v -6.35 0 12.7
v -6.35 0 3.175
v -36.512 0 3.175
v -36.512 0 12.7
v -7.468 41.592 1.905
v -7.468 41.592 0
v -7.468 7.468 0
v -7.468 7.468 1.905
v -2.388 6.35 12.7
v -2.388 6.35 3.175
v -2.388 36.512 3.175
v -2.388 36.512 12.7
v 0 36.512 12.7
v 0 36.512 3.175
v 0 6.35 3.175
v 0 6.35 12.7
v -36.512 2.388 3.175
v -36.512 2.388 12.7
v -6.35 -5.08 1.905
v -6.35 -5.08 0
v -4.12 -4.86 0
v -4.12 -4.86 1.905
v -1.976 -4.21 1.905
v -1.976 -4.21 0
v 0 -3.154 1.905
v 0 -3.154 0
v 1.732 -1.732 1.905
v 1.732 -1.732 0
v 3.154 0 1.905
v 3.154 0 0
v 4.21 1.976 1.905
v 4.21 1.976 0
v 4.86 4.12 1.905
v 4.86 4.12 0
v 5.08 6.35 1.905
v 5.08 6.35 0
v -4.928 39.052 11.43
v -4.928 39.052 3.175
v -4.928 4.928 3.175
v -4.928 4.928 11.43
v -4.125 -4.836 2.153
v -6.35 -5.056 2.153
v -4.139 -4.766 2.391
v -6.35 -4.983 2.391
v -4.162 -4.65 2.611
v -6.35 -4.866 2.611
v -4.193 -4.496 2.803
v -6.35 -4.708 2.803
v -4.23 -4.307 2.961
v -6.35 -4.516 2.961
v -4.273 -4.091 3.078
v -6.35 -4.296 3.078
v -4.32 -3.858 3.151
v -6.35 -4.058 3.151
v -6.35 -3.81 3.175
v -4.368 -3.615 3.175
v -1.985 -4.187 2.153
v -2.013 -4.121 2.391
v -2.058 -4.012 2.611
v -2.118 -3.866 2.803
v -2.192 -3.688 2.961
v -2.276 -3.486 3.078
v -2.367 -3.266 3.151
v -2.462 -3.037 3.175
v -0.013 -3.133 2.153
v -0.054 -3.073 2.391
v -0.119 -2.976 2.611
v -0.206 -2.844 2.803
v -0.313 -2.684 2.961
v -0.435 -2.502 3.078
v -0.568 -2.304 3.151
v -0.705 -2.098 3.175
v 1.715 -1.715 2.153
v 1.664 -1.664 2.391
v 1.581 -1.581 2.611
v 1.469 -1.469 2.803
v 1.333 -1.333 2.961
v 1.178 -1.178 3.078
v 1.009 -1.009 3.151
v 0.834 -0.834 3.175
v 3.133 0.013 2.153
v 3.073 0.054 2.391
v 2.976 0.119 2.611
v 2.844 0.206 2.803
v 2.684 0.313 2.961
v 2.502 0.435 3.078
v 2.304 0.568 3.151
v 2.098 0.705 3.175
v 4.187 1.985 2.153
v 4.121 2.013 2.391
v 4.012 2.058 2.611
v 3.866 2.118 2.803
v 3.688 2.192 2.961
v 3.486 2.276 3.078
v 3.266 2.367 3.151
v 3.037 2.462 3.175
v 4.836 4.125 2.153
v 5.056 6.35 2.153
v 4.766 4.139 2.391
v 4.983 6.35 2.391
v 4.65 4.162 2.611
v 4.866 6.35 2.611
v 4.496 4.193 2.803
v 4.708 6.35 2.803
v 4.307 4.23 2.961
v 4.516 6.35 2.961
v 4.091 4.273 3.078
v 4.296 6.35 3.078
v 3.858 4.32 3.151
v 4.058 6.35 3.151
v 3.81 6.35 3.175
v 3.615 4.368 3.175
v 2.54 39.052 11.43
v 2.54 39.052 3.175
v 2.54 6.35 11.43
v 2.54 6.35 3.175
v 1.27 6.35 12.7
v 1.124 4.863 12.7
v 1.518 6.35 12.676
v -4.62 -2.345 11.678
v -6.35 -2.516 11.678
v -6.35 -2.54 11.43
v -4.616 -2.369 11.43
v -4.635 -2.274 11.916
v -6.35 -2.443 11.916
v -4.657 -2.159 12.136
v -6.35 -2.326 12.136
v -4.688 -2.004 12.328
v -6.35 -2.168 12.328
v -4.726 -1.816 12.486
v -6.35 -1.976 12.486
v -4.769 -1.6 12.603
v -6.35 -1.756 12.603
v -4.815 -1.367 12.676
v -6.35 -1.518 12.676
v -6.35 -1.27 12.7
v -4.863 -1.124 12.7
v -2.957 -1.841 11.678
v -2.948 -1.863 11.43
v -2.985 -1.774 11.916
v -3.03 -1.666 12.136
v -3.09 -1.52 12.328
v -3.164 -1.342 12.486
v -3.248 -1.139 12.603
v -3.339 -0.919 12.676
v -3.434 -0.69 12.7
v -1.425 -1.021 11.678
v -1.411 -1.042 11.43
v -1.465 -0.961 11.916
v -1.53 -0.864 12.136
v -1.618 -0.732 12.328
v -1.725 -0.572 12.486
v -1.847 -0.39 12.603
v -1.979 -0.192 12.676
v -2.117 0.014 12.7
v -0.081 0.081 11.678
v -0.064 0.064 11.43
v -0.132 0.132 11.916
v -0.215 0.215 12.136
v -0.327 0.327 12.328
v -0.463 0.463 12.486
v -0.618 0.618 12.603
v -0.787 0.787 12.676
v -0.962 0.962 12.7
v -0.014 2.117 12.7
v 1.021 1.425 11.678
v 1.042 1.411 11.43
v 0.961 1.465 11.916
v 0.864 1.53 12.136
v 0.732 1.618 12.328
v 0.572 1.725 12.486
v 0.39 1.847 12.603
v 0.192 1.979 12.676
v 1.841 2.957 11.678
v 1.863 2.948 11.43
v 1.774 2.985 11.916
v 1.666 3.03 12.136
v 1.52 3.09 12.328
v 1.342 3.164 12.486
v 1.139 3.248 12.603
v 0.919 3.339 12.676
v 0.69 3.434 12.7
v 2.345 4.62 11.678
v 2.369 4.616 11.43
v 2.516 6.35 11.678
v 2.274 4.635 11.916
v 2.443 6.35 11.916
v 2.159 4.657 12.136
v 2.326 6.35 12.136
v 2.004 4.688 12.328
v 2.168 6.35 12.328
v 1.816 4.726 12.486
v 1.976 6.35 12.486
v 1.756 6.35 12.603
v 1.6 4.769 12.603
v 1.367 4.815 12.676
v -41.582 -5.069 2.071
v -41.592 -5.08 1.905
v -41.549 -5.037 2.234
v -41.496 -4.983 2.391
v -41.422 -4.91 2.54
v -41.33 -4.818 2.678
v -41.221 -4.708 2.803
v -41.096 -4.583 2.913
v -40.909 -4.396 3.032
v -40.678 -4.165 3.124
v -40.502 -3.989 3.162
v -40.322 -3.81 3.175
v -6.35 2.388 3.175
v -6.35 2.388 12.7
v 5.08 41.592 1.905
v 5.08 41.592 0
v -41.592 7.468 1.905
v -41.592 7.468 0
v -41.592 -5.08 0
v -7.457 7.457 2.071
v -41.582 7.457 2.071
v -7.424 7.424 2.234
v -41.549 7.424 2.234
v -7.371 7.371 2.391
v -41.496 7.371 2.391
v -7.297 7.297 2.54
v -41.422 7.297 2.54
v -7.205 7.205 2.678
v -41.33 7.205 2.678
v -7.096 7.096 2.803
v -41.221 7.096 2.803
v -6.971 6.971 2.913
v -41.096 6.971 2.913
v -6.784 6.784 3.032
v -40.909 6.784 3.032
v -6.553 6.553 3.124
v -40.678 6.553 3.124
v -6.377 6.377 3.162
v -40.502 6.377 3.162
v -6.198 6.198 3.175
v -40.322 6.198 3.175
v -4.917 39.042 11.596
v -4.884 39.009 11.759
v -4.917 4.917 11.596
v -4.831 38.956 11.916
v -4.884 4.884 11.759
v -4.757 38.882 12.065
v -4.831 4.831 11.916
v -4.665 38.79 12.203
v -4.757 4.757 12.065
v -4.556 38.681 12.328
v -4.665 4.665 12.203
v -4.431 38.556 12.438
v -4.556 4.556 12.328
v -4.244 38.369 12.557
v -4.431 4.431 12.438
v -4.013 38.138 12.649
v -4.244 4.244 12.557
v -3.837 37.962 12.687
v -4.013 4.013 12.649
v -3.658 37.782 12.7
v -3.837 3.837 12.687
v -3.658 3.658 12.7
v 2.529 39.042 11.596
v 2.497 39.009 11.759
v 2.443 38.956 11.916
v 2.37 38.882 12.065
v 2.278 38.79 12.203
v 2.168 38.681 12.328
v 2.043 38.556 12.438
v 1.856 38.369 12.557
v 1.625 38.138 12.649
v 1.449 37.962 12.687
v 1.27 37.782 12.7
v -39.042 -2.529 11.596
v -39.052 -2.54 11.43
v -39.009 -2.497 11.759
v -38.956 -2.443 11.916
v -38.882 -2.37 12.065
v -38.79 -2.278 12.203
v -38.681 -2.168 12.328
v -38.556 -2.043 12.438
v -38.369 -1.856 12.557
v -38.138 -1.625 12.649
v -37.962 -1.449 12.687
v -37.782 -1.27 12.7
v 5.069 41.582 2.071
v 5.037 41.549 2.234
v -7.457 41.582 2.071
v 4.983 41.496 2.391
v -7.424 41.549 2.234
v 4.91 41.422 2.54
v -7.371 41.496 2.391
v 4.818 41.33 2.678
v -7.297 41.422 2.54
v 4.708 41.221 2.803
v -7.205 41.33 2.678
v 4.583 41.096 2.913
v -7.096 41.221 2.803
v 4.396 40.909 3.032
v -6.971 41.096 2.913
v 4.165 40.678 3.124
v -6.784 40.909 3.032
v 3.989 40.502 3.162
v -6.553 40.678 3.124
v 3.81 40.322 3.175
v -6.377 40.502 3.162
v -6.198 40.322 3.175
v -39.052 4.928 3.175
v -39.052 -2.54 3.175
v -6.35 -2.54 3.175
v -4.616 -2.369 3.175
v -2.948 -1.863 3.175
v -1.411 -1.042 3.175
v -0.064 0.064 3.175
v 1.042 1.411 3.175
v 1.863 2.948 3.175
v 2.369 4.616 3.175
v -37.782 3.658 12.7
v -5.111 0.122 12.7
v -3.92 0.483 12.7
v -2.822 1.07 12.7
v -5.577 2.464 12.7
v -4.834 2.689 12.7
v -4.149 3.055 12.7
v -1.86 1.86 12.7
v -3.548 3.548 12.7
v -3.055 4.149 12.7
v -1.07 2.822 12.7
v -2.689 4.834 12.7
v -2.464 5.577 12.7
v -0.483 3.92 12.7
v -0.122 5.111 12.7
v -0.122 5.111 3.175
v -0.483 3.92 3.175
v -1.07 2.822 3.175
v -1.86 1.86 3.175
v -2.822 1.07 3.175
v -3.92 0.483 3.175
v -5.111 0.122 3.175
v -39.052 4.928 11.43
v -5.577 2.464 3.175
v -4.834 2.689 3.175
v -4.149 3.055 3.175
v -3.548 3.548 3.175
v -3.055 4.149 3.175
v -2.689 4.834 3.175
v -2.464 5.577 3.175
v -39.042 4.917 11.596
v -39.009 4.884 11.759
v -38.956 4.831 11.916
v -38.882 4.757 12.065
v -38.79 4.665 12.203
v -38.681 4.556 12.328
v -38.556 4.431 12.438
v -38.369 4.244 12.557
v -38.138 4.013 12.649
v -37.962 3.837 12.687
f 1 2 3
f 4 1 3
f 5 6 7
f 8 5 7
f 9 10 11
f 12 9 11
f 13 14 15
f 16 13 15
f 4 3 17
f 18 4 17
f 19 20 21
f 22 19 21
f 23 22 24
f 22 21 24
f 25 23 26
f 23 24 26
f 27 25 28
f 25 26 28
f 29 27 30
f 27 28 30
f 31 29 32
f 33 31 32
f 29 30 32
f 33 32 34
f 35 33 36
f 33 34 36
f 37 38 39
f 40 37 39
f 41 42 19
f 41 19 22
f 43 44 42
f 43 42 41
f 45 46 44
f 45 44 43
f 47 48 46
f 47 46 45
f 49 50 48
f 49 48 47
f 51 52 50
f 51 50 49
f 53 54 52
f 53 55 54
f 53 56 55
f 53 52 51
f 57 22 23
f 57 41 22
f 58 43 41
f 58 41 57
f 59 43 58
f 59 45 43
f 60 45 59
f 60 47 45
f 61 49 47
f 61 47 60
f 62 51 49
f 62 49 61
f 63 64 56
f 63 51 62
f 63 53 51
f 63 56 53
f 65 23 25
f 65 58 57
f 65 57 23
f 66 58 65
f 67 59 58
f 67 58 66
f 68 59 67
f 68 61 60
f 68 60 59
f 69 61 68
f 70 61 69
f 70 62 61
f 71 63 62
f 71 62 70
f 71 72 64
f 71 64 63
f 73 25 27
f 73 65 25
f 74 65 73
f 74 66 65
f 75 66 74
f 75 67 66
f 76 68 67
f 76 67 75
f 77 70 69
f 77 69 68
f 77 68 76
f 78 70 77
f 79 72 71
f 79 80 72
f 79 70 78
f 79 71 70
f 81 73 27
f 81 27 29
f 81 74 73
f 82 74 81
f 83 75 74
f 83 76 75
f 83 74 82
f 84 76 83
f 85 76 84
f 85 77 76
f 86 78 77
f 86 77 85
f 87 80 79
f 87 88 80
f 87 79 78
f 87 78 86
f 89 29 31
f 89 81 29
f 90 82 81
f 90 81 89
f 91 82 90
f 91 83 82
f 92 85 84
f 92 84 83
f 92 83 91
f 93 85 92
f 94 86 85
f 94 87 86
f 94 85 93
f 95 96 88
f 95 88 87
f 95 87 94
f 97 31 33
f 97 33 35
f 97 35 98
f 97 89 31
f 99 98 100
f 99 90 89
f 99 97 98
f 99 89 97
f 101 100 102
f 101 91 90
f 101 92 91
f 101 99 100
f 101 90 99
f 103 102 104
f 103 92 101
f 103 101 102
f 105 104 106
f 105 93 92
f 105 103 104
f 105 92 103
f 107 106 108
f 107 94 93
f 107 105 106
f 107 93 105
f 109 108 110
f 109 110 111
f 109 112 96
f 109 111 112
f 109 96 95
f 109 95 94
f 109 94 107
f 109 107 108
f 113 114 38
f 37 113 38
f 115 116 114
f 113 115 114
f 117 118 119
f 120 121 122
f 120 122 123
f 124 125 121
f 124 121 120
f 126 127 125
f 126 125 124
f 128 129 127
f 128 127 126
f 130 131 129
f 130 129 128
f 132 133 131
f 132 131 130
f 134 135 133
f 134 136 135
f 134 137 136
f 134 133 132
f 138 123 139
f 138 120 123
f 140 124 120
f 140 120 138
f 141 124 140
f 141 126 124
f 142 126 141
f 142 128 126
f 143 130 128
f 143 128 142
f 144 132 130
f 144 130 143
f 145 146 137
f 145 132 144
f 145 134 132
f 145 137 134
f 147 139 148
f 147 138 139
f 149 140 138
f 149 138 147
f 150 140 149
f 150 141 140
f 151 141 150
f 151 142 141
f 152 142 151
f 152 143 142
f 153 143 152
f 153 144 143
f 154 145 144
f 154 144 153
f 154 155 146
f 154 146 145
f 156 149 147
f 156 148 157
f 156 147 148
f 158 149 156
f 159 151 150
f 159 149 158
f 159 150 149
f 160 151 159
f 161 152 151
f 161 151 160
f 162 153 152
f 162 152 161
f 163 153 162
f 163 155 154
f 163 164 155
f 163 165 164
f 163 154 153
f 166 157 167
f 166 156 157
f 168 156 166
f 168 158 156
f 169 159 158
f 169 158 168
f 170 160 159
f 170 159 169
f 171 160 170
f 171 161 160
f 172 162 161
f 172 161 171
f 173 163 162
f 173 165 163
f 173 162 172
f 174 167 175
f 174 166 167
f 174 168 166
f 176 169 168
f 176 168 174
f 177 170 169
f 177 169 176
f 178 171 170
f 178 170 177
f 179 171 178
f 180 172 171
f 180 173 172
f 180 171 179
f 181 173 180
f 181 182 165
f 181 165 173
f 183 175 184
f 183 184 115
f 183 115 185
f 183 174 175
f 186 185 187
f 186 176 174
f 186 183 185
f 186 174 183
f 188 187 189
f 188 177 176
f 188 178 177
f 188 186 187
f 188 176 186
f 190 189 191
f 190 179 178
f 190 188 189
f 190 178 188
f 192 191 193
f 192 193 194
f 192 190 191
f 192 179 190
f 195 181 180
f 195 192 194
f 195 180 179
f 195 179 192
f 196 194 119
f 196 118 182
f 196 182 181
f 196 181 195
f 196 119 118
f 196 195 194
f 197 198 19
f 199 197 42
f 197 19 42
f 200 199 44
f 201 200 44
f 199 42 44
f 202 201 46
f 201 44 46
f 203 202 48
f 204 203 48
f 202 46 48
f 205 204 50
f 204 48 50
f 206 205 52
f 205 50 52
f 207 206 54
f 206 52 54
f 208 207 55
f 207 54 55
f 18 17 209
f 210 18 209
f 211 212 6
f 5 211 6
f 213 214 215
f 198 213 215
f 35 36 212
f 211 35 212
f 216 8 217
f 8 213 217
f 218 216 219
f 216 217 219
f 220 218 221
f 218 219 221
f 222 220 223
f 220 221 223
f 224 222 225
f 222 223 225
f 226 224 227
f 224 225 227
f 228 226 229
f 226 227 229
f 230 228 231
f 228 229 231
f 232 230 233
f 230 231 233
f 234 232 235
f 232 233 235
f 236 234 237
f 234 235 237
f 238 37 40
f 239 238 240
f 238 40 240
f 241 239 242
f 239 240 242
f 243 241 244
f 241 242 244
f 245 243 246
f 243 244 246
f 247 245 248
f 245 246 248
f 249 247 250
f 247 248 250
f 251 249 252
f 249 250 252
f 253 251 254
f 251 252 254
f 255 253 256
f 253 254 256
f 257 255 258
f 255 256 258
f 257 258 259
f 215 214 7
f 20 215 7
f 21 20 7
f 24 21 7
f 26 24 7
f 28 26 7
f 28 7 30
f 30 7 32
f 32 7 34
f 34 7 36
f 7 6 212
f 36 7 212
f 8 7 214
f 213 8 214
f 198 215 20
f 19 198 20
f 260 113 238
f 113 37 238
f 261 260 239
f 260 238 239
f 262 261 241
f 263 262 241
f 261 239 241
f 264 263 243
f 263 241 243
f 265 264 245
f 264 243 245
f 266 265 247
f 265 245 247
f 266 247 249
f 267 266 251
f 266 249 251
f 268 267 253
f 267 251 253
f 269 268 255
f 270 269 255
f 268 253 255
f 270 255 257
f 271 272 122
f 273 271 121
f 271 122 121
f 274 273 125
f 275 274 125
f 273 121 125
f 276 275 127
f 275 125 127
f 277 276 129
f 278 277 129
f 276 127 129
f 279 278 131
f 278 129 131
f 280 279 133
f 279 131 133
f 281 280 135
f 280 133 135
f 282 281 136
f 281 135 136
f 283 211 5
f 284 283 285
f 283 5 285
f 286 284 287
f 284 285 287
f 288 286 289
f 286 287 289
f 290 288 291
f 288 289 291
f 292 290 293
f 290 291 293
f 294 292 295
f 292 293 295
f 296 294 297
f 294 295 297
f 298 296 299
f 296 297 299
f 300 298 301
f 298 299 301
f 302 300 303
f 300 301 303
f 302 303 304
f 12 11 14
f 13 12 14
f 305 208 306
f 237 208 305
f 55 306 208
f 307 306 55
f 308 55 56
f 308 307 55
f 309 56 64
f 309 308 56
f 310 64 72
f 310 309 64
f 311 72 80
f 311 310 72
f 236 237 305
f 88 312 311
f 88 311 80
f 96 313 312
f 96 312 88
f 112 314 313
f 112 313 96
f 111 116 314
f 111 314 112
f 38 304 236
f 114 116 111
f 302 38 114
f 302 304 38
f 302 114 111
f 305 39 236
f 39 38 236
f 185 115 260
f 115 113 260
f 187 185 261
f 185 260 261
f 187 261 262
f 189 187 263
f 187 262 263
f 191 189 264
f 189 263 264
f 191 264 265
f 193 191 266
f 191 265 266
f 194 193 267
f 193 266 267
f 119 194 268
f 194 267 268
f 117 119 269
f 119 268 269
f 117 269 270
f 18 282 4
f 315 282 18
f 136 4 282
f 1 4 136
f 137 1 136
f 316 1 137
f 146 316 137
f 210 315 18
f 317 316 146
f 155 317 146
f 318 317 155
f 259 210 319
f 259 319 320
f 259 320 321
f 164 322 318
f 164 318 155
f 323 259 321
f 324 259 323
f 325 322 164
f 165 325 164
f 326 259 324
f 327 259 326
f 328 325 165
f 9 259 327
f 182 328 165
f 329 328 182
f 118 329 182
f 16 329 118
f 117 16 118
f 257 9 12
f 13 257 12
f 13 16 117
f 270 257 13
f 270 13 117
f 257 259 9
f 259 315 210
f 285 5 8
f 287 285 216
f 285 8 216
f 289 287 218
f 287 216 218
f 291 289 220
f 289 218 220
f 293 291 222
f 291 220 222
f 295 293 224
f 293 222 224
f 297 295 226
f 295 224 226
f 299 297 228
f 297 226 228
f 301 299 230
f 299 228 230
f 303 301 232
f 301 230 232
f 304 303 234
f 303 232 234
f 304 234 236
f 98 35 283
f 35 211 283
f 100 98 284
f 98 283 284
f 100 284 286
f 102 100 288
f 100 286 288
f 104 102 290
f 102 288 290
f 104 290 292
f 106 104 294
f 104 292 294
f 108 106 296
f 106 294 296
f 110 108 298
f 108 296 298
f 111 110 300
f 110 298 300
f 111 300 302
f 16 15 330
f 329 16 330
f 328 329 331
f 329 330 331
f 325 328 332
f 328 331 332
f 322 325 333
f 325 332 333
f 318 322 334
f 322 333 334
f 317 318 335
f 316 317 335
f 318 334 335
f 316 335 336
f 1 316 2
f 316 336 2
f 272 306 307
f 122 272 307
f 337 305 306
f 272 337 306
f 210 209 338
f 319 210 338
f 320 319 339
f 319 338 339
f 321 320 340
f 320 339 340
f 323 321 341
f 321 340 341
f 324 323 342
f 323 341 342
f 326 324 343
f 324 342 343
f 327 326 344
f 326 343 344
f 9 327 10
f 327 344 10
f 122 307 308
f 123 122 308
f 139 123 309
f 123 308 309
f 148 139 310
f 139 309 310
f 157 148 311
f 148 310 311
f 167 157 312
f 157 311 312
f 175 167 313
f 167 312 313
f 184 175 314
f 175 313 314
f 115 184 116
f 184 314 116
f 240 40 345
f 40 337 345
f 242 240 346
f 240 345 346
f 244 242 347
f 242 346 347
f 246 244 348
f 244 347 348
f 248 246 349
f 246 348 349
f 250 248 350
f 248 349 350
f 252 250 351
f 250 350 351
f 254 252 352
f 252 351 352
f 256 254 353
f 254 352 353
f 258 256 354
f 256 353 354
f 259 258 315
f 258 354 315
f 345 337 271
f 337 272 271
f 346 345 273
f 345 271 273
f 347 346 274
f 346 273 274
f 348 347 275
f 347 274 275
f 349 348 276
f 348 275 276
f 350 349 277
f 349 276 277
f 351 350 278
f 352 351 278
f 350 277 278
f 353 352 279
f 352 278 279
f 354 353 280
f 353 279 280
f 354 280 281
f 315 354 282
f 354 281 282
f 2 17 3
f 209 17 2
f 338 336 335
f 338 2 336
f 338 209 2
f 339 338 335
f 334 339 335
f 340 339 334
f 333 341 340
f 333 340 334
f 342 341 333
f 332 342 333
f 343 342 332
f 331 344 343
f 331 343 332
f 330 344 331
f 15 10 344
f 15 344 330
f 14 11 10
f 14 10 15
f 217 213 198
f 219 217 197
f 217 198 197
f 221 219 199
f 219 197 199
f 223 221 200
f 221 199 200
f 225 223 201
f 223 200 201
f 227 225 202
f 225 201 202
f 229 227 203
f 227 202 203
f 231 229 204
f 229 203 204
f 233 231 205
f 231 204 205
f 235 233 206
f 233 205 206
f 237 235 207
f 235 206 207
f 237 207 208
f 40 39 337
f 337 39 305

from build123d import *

# Parameters (mm, degrees)
F0_W     = 2.3876
F0_H     = 2.54
F0_W_2   = 2.54
F0_H_2   = 2.3876
F1_DEPTH = 3.175
F2_DEPTH = 12.7
F3_R     = 1.27


with BuildPart() as f1:
    # F0 (on Top) → F1 (new body)
    with BuildSketch(Plane.XY):
        Polygon((-34.1249, 7.4676), (-34.1249, 4.9276), (-4.9276, 4.9276), (-4.9276, 34.1249), (-7.4676, 34.1249), (-7.4676, 7.4676), align=None)
        with Locations((-35.3187, 6.1976)):
            Rectangle(F0_W, F0_H)
        with BuildLine():
            Line((-39.0525, 4.9276), (-36.5125, 4.9276))
            Line((-36.5125, 4.9276), (-36.5125, 7.4676))
            Line((-36.5125, 7.4676), (-41.5925, 7.4676))
            Line((-41.5925, 7.4676), (-41.5925, -5.08))
            Line((-41.5925, -5.08), (-6.35, -5.08))
            ThreePointArc((-6.35, -5.08), (1.732230509, -1.732230509), (5.08, 6.35))
            Line((5.08, 6.35), (5.08, 41.5925))
            Line((5.08, 41.5925), (-7.4676, 41.5925))
            Line((-7.4676, 41.5925), (-7.4676, 36.5125))
            Line((-7.4676, 36.5125), (-4.9276, 36.5125))
            Line((-4.9276, 36.5125), (-4.9276, 39.0525))
            Line((-4.9276, 39.0525), (2.54, 39.0525))
            Line((2.54, 39.0525), (2.54, 6.35))
            ThreePointArc((2.54, 6.35), (-0.0638207153, 0.0638207153), (-6.35, -2.54))
            Line((-6.35, -2.54), (-39.0525, -2.54))
            Line((-39.0525, -2.54), (-39.0525, 4.9276))
        make_face()
        with BuildLine():
            Line((-34.1249, 4.9276), (-34.1249, 2.3876))
            Line((-34.1249, 2.3876), (-6.35, 2.3876))
            ThreePointArc((-6.35, 2.3876), (-3.5481600902, 3.5481600902), (-2.3876, 6.35))
            Line((-2.3876, 6.35), (-2.3876, 34.1249))
            Line((-2.3876, 34.1249), (-4.9276, 34.1249))
            Line((-4.9276, 34.1249), (-4.9276, 4.9276))
            Line((-4.9276, 4.9276), (-34.1249, 4.9276))
        make_face()
        with BuildLine():
            Line((-36.5125, 0), (-6.35, 0))
            ThreePointArc((-6.35, 0), (-1.8598719395, 1.8598719395), (0, 6.35))
            Line((0, 6.35), (0, 36.5125))
            Line((0, 36.5125), (-2.3876, 36.5125))
            Line((-2.3876, 36.5125), (-2.3876, 34.1249))
            Line((-2.3876, 34.1249), (-2.3876, 6.35))
            ThreePointArc((-2.3876, 6.35), (-3.5481600902, 3.5481600902), (-6.35, 2.3876))
            Line((-6.35, 2.3876), (-34.1249, 2.3876))
            Line((-34.1249, 2.3876), (-36.5125, 2.3876))
            Line((-36.5125, 2.3876), (-36.5125, 0))
        make_face()
        with BuildLine():
            ThreePointArc((0, 6.35), (-1.8598719395, 1.8598719395), (-6.35, 0))
            Line((-6.35, 0), (-36.5125, 0))
            Line((-36.5125, 0), (-36.5125, 2.3876))
            Line((-36.5125, 2.3876), (-36.5125, 4.9276))
            Line((-36.5125, 4.9276), (-39.0525, 4.9276))
            Line((-39.0525, 4.9276), (-39.0525, -2.54))
            Line((-39.0525, -2.54), (-6.35, -2.54))
            ThreePointArc((-6.35, -2.54), (-0.0638207153, 0.0638207153), (2.54, 6.35))
            Line((2.54, 6.35), (2.54, 39.0525))
            Line((2.54, 39.0525), (-4.9276, 39.0525))
            Line((-4.9276, 39.0525), (-4.9276, 36.5125))
            Line((-4.9276, 36.5125), (-2.3876, 36.5125))
            Line((-2.3876, 36.5125), (0, 36.5125))
            Line((0, 36.5125), (0, 6.35))
        make_face()
        with Locations((-35.3187, 3.6576)):
            Rectangle(F0_W, F0_H)
        with Locations((-3.6576, 35.3187)):
            Rectangle(F0_W_2, F0_H_2)
        with Locations((-6.1976, 35.3187)):
            Rectangle(F0_W_2, F0_H_2)
    extrude(amount=F1_DEPTH)

    # F0 (on Top) → F2 (join)
    with BuildSketch(Plane.XY):
        with BuildLine():
            ThreePointArc((0, 6.35), (-1.8598719395, 1.8598719395), (-6.35, 0))
            Line((-6.35, 0), (-36.5125, 0))
            Line((-36.5125, 0), (-36.5125, 2.3876))
            Line((-36.5125, 2.3876), (-36.5125, 4.9276))
            Line((-36.5125, 4.9276), (-39.0525, 4.9276))
            Line((-39.0525, 4.9276), (-39.0525, -2.54))
            Line((-39.0525, -2.54), (-6.35, -2.54))
            ThreePointArc((-6.35, -2.54), (-0.0638207153, 0.0638207153), (2.54, 6.35))
            Line((2.54, 6.35), (2.54, 39.0525))
            Line((2.54, 39.0525), (-4.9276, 39.0525))
            Line((-4.9276, 39.0525), (-4.9276, 36.5125))
            Line((-4.9276, 36.5125), (-2.3876, 36.5125))
            Line((-2.3876, 36.5125), (0, 36.5125))
            Line((0, 36.5125), (0, 6.35))
        make_face()
        with BuildLine():
            Line((-34.1249, 4.9276), (-34.1249, 2.3876))
            Line((-34.1249, 2.3876), (-6.35, 2.3876))
            ThreePointArc((-6.35, 2.3876), (-3.5481600902, 3.5481600902), (-2.3876, 6.35))
            Line((-2.3876, 6.35), (-2.3876, 34.1249))
            Line((-2.3876, 34.1249), (-4.9276, 34.1249))
            Line((-4.9276, 34.1249), (-4.9276, 4.9276))
            Line((-4.9276, 4.9276), (-34.1249, 4.9276))
        make_face()
        with Locations((-35.3187, 3.6576)):
            Rectangle(F0_W, F0_H)
        with Locations((-3.6576, 35.3187)):
            Rectangle(F0_W_2, F0_H_2)
    extrude(amount=F2_DEPTH)

    # F3
    f3_edges = [f1.edges().sort_by_distance(p)[0] for p in [
        (5.08, 23.97125, 3.175),
        (-1.1938, 41.5925, 3.175),
        (-7.4676, 24.53005, 3.175),
        (-24.53005, 7.4676, 3.175),
        (-41.5925, 1.1938, 3.175),
        (-4.9276, 21.99005, 12.7),
        (-1.1938, 39.0525, 12.7),
        (2.54, 22.70125, 12.7),
        (-21.99005, 4.9276, 12.7),
        (-39.0525, 1.1938, 12.7),
    ]]
    fillet(f3_edges, radius=F3_R)


solid = f1.part
